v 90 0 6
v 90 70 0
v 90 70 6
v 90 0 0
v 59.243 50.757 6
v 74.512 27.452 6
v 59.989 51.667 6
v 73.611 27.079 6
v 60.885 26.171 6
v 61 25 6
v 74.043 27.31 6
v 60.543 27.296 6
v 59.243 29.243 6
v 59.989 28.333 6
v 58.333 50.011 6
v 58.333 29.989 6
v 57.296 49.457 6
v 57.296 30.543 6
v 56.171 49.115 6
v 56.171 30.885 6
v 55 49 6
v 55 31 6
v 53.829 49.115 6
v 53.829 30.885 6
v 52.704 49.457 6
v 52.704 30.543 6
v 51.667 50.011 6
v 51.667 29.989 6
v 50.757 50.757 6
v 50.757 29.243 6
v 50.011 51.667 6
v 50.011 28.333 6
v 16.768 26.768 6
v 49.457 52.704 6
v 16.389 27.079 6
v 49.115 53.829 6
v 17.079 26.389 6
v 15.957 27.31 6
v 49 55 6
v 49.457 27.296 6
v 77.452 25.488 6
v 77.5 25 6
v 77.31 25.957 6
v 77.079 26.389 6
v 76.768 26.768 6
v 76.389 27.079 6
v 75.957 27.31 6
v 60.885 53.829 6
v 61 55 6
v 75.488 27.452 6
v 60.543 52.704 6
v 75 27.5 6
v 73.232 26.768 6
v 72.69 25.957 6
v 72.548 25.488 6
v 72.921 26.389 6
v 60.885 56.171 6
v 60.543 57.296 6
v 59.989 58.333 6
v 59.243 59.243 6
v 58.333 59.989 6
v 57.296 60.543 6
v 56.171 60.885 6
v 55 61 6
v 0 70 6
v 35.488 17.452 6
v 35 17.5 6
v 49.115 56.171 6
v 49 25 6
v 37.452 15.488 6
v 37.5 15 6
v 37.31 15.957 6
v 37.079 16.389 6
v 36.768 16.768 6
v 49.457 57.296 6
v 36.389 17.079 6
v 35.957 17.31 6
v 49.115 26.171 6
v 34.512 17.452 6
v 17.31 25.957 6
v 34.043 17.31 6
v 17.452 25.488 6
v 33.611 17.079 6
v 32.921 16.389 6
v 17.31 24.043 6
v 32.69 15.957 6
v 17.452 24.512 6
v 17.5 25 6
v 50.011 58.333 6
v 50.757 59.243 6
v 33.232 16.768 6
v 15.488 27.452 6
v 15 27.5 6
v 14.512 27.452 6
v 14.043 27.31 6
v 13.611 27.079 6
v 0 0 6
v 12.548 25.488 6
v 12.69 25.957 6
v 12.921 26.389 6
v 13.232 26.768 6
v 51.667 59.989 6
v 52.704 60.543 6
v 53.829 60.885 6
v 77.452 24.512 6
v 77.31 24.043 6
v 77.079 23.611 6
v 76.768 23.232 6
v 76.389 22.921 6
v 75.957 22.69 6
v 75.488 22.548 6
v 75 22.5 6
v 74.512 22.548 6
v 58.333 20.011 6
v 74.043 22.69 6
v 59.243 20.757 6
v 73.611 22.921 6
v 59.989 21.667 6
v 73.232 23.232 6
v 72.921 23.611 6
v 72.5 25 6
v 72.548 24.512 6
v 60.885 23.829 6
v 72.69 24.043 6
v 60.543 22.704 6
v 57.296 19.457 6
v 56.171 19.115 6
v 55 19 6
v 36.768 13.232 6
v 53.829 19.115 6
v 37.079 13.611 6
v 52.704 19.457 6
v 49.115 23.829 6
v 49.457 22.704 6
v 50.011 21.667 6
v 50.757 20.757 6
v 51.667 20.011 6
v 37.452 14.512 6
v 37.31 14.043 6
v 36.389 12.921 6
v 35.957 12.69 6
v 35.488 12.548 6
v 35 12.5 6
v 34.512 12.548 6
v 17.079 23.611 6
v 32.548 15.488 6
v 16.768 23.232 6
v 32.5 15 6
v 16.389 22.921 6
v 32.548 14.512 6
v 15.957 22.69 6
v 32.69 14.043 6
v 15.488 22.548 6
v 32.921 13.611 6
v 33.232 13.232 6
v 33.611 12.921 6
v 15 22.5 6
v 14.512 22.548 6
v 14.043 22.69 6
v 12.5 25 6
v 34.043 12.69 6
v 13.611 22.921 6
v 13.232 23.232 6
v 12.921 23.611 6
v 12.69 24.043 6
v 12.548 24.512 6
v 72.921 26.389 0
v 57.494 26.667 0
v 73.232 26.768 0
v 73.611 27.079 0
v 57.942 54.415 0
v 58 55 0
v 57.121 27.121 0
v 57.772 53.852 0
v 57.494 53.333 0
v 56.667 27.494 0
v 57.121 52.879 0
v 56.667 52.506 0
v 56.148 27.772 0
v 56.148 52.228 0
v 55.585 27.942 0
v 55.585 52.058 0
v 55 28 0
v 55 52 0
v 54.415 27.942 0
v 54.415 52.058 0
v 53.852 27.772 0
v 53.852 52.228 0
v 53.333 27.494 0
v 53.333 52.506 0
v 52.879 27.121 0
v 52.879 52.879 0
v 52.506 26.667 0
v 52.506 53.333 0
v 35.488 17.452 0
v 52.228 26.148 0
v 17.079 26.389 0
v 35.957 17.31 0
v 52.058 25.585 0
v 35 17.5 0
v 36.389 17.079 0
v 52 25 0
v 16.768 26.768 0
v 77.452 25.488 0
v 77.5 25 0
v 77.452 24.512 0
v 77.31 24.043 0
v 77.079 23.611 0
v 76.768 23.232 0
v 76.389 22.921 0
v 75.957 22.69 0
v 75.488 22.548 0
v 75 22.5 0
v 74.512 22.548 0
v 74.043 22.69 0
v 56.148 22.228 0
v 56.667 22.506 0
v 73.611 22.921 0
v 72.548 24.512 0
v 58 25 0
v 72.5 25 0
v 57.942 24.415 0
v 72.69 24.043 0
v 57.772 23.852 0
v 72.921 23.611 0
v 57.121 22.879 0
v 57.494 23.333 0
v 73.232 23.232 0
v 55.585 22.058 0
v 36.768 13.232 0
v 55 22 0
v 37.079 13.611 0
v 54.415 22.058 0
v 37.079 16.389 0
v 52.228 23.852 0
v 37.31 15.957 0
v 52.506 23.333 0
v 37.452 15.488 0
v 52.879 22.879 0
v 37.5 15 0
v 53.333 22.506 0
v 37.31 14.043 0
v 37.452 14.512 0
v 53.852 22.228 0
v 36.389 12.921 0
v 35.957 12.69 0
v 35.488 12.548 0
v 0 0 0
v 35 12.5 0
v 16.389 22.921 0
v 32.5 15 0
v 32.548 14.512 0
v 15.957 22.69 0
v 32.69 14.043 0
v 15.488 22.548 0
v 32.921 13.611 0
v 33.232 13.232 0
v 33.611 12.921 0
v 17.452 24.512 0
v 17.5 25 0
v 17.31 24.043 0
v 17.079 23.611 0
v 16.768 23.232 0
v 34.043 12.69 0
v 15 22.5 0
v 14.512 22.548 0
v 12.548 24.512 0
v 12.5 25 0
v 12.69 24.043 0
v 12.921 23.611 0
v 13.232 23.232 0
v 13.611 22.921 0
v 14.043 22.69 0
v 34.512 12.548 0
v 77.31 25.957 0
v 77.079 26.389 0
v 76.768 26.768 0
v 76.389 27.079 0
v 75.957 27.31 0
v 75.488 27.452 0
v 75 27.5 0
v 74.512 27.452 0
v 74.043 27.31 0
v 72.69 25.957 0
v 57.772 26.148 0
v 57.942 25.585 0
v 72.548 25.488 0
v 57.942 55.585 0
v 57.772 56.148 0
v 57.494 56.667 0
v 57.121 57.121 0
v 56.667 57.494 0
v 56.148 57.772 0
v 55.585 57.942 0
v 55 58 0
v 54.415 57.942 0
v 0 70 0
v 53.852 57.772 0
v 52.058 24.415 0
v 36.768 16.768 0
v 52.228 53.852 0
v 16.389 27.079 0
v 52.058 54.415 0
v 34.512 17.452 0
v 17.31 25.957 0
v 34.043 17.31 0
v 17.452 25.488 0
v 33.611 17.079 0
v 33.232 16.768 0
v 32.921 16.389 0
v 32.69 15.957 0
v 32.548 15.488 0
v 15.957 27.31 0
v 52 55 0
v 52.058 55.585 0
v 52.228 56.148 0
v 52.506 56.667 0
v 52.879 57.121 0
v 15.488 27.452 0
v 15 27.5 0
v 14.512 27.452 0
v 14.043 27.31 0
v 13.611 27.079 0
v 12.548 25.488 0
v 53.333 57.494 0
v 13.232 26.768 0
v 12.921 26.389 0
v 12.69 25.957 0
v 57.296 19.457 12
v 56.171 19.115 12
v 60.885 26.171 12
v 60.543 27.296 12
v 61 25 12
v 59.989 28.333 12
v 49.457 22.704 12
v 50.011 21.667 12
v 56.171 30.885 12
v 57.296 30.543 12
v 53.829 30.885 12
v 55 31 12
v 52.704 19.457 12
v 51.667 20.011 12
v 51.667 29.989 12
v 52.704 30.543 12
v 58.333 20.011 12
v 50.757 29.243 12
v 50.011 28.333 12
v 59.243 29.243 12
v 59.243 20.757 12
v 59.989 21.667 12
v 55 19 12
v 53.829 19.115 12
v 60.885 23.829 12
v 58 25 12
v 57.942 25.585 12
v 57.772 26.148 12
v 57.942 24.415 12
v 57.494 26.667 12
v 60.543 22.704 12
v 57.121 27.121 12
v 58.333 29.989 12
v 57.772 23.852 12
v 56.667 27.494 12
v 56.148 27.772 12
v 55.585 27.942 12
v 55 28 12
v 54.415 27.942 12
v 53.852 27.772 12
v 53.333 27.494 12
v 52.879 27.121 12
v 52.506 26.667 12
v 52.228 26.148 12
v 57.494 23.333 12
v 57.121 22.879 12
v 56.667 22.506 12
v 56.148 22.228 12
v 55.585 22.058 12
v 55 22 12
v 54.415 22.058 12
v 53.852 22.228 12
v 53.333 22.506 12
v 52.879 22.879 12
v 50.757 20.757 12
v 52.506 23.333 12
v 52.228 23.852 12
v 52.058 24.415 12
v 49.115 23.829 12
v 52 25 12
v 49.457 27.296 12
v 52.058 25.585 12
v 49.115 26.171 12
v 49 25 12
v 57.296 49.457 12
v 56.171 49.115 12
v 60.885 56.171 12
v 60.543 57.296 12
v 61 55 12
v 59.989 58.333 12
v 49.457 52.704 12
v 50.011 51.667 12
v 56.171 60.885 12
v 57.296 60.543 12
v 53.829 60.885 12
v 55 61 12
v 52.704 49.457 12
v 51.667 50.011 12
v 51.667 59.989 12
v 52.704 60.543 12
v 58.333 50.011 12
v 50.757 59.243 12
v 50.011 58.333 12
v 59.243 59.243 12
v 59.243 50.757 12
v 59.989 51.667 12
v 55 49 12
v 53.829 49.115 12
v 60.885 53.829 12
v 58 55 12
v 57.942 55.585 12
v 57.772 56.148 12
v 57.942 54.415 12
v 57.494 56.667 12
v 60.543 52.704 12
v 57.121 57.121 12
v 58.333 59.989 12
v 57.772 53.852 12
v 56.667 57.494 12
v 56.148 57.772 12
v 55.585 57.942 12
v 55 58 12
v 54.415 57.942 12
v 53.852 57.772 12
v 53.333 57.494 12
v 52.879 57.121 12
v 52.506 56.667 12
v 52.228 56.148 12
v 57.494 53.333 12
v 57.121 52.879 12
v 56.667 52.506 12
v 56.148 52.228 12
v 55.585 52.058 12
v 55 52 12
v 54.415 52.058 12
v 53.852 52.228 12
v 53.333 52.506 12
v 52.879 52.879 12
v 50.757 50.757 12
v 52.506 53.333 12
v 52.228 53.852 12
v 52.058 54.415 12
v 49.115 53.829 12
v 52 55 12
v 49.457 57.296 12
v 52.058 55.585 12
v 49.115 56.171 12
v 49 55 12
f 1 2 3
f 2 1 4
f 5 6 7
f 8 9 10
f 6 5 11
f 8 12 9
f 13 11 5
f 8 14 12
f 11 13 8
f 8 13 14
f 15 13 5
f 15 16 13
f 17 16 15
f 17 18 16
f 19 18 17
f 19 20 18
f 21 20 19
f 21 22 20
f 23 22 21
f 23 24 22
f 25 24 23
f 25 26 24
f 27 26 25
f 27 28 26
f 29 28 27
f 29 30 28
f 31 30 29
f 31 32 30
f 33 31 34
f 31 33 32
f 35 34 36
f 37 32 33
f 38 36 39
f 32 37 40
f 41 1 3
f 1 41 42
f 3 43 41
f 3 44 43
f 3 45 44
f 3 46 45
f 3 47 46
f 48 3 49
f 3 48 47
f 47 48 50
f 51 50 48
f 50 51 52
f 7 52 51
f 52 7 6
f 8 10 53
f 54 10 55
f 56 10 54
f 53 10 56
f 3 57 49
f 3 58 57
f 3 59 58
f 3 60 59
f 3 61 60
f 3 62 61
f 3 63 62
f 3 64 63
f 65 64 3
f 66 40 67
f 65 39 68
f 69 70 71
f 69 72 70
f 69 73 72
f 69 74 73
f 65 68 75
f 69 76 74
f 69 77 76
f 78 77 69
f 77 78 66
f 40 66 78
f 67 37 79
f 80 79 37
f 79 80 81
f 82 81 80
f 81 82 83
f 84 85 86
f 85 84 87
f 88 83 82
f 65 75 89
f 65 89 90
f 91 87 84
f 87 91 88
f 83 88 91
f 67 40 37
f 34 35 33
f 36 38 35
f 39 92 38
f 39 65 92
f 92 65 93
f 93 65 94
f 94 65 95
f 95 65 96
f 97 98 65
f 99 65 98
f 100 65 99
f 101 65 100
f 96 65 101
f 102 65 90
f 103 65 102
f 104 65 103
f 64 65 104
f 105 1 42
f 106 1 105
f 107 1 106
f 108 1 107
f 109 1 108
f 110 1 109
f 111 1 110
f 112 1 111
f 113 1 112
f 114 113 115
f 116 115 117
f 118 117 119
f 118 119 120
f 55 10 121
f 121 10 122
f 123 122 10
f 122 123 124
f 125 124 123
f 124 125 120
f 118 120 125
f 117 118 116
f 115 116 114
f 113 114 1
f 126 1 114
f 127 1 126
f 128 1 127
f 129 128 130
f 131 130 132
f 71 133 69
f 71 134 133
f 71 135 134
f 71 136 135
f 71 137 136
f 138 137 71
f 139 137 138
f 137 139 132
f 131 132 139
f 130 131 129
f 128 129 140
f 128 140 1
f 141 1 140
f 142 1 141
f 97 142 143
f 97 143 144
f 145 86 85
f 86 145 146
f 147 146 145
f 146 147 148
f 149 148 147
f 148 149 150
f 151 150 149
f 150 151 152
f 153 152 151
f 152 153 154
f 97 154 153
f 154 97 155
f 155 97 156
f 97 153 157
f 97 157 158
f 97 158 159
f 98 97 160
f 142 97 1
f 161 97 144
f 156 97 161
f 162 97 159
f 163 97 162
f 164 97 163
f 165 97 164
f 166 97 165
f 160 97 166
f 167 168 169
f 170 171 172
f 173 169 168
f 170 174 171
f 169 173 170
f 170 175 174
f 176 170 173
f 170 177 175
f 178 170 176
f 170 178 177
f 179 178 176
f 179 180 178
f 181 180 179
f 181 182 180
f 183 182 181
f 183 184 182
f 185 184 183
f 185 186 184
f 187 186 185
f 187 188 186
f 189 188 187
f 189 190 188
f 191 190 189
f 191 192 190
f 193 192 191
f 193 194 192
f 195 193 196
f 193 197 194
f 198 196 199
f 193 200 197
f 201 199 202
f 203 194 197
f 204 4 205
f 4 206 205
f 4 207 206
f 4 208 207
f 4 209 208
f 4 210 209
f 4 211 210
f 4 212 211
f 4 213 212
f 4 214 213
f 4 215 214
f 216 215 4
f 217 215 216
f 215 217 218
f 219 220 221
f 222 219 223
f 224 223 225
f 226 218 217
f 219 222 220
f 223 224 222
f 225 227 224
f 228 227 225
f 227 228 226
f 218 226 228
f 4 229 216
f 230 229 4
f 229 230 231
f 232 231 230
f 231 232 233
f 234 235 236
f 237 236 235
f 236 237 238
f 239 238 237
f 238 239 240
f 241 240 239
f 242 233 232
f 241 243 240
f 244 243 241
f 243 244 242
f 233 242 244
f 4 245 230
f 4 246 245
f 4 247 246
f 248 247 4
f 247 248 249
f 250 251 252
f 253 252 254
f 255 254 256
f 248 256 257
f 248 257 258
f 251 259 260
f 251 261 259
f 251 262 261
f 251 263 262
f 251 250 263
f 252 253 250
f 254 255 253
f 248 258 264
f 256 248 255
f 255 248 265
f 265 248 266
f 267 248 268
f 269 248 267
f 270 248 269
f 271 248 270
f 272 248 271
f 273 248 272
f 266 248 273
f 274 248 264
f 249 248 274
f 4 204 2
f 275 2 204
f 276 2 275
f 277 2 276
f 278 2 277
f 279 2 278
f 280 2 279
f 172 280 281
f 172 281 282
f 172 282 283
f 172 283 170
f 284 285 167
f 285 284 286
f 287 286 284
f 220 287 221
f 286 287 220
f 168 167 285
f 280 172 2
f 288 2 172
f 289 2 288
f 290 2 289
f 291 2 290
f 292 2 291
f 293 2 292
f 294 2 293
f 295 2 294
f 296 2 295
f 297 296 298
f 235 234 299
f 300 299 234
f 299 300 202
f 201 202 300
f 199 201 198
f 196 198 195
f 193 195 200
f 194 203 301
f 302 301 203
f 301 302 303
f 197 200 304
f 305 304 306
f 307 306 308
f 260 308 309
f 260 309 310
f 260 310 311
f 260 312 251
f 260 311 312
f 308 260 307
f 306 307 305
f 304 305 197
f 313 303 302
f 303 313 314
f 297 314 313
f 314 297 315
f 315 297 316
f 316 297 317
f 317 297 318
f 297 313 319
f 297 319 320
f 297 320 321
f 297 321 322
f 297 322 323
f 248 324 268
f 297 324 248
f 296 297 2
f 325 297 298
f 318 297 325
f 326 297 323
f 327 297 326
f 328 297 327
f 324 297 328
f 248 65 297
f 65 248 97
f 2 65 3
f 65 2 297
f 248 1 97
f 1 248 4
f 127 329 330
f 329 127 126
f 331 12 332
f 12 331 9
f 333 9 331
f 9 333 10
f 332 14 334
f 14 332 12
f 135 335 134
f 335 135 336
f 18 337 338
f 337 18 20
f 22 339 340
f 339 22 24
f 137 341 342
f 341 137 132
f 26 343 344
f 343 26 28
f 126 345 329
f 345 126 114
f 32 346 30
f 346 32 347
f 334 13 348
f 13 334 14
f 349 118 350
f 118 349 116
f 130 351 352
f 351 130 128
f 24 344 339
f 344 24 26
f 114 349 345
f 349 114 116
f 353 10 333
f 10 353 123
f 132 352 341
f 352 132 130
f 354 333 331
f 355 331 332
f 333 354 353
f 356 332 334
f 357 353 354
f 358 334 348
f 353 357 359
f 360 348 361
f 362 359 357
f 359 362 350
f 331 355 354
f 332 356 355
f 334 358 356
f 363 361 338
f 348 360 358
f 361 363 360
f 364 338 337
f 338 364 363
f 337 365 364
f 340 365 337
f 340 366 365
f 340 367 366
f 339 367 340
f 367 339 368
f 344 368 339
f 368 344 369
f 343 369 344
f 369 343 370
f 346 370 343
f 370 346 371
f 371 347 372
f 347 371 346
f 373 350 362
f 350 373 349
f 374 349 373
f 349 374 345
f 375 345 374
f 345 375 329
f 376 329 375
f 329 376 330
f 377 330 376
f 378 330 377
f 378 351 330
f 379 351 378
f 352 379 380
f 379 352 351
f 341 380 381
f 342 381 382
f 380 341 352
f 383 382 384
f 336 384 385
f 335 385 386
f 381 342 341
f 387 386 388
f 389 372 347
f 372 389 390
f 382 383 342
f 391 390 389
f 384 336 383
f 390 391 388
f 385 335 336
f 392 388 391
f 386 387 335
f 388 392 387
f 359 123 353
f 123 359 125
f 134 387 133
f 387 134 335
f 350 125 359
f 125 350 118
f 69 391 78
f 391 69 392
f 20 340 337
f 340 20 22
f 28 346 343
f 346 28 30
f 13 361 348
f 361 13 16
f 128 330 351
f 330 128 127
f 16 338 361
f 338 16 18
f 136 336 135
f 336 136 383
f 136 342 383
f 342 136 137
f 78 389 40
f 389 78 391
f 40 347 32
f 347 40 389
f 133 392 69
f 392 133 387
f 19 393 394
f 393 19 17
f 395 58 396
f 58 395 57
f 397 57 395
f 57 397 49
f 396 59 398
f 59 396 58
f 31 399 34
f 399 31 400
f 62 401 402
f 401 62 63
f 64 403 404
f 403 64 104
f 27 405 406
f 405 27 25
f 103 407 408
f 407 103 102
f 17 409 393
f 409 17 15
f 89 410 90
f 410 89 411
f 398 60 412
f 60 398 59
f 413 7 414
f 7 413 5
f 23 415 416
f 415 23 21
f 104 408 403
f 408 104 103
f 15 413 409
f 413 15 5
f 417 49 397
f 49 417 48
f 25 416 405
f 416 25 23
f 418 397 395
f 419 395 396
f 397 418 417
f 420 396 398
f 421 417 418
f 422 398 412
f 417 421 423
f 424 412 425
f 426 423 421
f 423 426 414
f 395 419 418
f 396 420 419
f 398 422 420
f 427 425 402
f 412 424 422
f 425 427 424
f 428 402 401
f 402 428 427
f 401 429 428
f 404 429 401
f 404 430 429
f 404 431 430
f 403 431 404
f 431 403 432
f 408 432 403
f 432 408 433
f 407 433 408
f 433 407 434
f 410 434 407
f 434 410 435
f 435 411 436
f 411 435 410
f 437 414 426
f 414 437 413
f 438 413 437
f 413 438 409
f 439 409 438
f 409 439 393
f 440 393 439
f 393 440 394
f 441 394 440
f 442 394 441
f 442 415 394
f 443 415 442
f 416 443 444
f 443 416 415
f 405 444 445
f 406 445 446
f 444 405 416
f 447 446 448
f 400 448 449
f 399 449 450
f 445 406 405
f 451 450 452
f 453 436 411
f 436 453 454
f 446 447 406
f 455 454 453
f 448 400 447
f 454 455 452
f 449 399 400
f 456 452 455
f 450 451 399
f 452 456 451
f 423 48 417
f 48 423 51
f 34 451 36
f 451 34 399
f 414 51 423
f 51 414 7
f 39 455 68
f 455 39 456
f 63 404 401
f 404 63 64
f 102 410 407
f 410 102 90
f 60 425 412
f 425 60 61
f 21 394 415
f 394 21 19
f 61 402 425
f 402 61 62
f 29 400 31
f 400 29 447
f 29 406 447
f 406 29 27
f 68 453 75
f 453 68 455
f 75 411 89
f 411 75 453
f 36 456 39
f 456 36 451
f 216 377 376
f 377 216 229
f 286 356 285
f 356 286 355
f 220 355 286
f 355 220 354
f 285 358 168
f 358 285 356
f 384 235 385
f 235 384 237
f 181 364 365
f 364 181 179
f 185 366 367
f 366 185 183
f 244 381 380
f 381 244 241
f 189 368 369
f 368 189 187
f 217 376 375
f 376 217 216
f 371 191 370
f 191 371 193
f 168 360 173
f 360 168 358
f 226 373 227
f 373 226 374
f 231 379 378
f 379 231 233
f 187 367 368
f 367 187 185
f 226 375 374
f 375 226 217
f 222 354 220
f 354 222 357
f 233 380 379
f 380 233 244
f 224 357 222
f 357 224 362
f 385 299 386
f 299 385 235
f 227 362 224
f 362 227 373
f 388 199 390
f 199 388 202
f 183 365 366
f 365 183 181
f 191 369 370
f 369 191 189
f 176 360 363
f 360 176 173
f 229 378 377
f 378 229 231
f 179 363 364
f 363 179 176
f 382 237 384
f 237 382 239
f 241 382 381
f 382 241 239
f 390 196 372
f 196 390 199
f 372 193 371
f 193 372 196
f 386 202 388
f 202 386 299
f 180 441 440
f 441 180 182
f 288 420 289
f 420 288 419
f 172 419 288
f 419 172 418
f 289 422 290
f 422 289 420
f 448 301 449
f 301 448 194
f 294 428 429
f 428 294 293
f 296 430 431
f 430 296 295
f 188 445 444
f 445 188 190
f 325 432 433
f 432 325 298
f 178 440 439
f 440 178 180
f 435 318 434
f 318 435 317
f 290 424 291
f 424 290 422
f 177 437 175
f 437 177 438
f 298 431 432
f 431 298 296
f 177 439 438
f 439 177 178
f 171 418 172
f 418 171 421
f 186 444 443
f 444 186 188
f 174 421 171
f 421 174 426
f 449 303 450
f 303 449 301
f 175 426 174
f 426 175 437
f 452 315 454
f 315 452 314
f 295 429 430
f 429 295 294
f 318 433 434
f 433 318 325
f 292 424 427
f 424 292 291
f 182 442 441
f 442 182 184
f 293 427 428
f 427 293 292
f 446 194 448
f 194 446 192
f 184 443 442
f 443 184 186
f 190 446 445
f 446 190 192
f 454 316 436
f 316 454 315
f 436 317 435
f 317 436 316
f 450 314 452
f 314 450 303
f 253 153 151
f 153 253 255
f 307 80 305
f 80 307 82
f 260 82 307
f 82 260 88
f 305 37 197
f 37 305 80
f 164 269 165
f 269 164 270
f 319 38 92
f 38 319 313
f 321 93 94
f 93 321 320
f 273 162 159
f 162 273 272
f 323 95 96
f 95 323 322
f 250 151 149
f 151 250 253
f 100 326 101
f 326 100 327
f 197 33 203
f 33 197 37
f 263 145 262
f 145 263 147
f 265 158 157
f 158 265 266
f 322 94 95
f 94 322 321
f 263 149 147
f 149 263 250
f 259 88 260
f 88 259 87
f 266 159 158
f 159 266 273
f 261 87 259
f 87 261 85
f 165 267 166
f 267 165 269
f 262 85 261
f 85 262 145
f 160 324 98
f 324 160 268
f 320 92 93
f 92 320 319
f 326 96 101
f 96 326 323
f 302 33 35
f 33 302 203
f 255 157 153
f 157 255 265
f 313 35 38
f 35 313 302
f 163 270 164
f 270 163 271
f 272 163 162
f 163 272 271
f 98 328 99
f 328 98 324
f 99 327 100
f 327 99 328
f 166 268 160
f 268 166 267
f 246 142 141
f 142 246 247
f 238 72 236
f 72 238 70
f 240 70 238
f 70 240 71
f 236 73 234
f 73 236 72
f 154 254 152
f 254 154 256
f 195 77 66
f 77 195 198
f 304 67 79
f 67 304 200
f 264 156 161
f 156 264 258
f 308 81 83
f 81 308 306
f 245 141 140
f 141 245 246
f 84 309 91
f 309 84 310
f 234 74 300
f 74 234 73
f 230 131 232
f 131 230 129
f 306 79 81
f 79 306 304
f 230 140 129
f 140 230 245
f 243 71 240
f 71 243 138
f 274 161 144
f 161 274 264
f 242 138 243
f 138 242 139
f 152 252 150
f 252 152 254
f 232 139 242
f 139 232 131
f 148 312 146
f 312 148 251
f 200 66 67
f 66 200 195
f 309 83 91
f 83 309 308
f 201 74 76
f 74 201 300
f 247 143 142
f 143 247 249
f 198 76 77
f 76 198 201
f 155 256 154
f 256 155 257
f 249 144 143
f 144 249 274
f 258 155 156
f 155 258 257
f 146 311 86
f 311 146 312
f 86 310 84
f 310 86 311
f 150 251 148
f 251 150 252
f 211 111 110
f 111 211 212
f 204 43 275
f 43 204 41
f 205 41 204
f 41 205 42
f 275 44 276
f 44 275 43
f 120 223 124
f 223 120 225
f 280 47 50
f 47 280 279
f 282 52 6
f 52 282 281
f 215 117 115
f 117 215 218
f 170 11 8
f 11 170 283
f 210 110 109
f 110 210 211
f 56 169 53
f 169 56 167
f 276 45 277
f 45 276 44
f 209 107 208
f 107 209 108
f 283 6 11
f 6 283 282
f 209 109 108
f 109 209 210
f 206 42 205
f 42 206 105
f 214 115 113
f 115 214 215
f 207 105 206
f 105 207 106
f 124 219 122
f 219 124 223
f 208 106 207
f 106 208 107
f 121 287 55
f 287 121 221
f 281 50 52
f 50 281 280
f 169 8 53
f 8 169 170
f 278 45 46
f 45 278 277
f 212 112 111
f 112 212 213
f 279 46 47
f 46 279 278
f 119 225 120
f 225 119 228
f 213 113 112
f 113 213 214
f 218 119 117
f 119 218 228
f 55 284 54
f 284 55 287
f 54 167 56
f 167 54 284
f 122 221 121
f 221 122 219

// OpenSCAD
$fn = 32;

// ----------------------------------------------------------------------
// Mixed field: bosses and holes at given coordinates
// ----------------------------------------------------------------------

// --- parameters (mm) ---
plate_l = 90;             // plate length, X
plate_w = 70;             // plate width, Y
plate_t = 6;              // plate thickness, Z
boss_d = 12;              // boss diameter
boss_h = 6;               // boss height above the plate
hole_d = 5;               // through hole diameter

total_h = plate_t + boss_h;  // overall height

difference() {
  union() {
    cube([plate_l, plate_w, plate_t]);
    translate([55, 25, plate_t]) cylinder(h = boss_h, d = boss_d);
    translate([55, 55, plate_t]) cylinder(h = boss_h, d = boss_d);
  }
  translate([55, 25, -1]) cylinder(h = total_h + 2, d = boss_d / 2);
  translate([55, 55, -1]) cylinder(h = total_h + 2, d = boss_d / 2);
  translate([15, 25, -1]) cylinder(h = plate_t + 2, d = hole_d);
  translate([35, 15, -1]) cylinder(h = plate_t + 2, d = hole_d);
  translate([75, 25, -1]) cylinder(h = plate_t + 2, d = hole_d);
}
